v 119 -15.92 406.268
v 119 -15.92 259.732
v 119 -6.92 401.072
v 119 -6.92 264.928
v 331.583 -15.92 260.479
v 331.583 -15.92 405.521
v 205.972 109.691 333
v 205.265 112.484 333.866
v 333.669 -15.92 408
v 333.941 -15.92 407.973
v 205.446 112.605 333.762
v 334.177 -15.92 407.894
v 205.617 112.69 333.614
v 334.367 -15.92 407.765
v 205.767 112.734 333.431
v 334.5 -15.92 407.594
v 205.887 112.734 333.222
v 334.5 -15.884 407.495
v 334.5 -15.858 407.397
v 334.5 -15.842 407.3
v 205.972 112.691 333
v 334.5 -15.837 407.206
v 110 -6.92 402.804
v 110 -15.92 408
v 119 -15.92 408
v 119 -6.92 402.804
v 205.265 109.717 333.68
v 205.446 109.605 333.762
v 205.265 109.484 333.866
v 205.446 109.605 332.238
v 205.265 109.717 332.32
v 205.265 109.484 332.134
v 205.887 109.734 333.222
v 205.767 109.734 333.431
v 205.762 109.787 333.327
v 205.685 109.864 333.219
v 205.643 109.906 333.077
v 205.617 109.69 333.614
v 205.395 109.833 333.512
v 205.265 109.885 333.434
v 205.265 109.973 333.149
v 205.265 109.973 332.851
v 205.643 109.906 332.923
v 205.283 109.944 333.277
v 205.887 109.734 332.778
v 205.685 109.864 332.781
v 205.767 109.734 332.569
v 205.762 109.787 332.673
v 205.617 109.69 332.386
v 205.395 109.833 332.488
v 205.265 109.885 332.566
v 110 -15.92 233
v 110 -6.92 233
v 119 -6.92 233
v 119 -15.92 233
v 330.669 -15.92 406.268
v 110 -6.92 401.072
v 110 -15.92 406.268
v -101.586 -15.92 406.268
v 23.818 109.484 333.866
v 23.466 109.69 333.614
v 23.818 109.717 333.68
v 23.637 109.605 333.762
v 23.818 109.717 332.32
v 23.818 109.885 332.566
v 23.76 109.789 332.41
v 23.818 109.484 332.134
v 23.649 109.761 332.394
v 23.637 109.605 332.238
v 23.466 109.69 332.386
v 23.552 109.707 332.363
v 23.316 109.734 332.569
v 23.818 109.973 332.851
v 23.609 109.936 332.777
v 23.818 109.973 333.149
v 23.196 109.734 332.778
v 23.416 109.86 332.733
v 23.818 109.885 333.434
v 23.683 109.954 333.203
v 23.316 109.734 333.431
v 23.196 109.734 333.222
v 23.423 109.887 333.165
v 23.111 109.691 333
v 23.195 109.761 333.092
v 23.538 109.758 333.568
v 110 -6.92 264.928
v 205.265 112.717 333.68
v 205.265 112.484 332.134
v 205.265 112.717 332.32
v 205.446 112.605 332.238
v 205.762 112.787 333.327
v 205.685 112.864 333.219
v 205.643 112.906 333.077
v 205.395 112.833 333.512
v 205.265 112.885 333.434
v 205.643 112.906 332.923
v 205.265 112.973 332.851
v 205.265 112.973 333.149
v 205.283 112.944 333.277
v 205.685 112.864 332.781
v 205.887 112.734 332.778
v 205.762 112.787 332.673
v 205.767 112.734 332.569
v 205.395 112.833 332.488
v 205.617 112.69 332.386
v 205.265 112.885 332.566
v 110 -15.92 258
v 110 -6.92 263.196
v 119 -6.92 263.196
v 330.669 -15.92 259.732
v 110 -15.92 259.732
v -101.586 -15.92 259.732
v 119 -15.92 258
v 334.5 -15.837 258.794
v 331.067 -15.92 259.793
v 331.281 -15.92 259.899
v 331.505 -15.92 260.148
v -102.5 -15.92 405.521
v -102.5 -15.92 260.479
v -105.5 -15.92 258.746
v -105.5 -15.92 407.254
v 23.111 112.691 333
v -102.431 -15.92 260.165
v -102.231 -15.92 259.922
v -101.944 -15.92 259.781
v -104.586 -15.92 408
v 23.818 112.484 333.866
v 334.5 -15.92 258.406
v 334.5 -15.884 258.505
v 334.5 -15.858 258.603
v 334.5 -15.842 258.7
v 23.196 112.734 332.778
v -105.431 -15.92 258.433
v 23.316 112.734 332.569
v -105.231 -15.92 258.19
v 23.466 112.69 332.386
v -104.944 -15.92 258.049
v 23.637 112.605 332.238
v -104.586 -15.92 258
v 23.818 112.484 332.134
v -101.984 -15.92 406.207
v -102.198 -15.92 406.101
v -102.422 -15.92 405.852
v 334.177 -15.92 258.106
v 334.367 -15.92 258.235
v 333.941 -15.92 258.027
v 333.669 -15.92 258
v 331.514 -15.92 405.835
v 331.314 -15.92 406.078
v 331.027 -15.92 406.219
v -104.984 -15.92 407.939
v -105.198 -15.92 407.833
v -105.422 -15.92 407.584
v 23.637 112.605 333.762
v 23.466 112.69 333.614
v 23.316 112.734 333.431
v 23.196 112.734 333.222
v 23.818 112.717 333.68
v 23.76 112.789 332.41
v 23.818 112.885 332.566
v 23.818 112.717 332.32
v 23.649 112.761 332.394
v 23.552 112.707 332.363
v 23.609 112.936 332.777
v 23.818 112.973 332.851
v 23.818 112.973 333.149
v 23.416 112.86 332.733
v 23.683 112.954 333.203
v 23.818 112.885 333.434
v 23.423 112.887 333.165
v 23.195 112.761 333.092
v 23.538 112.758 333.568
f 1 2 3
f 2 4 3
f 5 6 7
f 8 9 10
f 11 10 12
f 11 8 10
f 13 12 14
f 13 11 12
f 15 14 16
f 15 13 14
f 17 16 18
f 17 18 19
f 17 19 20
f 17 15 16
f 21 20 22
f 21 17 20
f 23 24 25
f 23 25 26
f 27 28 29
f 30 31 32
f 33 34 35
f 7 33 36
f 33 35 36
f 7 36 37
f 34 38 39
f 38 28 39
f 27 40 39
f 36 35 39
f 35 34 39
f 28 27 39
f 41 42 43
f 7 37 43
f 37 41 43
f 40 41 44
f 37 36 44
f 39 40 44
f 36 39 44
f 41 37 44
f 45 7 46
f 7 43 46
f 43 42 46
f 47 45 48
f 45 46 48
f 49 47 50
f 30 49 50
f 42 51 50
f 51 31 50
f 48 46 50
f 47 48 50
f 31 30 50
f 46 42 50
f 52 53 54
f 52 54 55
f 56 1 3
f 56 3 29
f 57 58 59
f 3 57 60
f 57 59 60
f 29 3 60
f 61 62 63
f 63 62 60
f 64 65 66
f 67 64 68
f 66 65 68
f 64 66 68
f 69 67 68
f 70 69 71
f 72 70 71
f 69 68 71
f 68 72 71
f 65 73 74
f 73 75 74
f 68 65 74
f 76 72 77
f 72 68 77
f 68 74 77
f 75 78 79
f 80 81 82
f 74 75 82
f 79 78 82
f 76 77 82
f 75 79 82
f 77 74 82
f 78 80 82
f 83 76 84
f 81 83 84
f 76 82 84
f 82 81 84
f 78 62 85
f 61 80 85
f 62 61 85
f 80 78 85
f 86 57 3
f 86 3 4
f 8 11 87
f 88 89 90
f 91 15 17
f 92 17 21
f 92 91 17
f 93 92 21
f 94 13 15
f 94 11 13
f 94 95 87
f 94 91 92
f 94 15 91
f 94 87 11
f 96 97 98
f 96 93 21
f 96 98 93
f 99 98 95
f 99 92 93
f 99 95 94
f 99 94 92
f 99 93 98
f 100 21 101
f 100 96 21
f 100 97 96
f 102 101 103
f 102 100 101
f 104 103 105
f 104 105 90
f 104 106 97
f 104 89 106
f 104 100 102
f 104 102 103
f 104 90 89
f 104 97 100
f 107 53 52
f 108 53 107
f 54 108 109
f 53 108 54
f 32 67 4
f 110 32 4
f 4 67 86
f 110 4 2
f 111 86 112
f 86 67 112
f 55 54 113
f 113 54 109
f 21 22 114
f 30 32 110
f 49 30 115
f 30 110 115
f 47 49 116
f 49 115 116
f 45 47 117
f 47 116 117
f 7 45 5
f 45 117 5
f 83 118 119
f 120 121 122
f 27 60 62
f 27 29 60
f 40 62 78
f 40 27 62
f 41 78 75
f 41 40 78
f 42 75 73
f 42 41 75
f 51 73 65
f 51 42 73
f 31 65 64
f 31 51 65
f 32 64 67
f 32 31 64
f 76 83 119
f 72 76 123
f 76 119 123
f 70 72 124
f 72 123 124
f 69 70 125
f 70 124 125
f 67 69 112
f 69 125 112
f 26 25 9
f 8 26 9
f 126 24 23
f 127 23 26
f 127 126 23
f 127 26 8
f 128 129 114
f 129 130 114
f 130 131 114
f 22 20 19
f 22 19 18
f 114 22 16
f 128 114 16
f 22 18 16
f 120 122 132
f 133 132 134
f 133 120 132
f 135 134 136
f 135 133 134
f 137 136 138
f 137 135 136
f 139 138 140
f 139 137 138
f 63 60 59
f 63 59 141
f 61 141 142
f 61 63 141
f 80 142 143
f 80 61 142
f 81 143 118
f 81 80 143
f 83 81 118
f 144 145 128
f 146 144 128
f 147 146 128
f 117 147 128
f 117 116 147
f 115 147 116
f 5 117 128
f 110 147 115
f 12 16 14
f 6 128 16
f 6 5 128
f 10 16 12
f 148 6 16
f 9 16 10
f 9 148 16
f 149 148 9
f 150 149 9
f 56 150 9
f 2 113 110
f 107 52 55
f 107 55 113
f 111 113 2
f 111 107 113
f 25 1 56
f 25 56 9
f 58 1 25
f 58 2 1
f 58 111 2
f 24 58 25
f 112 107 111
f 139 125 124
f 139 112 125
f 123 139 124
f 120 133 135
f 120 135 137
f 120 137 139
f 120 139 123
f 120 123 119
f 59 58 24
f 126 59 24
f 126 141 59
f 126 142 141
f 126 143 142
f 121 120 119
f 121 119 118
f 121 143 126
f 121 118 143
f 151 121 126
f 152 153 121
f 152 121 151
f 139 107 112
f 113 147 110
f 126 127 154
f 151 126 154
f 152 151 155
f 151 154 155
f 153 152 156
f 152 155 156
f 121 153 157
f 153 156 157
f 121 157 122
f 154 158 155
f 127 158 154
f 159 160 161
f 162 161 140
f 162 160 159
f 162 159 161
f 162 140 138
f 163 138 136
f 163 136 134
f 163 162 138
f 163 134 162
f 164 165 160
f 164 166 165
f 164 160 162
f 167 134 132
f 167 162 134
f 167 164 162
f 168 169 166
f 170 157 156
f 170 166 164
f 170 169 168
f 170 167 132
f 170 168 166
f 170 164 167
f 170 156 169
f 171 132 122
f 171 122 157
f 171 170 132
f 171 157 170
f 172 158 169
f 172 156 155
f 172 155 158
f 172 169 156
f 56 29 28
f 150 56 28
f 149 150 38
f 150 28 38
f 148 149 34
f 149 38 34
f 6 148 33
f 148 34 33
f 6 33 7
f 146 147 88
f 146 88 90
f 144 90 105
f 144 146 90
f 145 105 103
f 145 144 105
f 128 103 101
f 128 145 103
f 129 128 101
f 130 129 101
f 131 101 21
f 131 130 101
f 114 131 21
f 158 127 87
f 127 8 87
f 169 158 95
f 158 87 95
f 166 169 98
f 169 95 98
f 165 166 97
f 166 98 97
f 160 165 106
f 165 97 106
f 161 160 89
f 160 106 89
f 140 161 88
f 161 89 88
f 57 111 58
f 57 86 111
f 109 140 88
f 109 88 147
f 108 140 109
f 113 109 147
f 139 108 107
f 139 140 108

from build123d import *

# Parameters (mm, degrees)
EXTRUDE001_DEPTH       = 9
BOX001_W               = 200
BOX001_H               = 200
BOX001_DEPTH           = 200
BOX001_PLACEMENT_ANGLE = 45
BOX_W                  = 200
BOX_H                  = 200
BOX_DEPTH              = 200
BOX_PLACEMENT_ANGLE    = 45
EXTRUDE_DEPTH          = 440
FILLET001_R            = 1
FILLET_R               = 1
FUSION_PLACEMENT_ANGLE = 90


with BuildPart() as extrude001:
    # Sketch001 → Extrude001 (new body)
    with BuildSketch(Plane.XY):
        Polygon((-75, 0), (-69.803848, 9), (100, 9), (100, 0), align=None)
    extrude(amount=EXTRUDE001_DEPTH)


with BuildPart() as extrude001_1:
    # Extrude001 placement: moved
    add(extrude001.part.moved(Location((0, 0, 215.5))))


with BuildPart() as cube001:
    # Box001 → Box001 (new body)
    with BuildSketch(Plane.XY):
        with Locations((100, 100)):
            Rectangle(BOX001_W, BOX001_H)
    extrude(amount=BOX001_DEPTH)


with BuildPart() as cube001_1:
    # Box001 placement: moved
    add(cube001.part.moved(Location((-96, 139.726, 300.357))).rotate(Axis((-96, 139.726, 300.357), (1, 0, 0)), BOX001_PLACEMENT_ANGLE))


with BuildPart() as cube:
    # Box → Box (new body)
    with BuildSketch(Plane.XY):
        with Locations((100, 100)):
            Rectangle(BOX_W, BOX_H)
    extrude(amount=BOX_DEPTH)


with BuildPart() as cube_1:
    # Box placement: moved
    add(cube.part.moved(Location((-96, 141.421356, -141.421356))).rotate(Axis((-96, 141.421356, -141.421356), (1, 0, 0)), BOX_PLACEMENT_ANGLE))


with BuildPart() as cut001:
    # Sketch → Extrude (new body)
    with BuildSketch(Plane.XY):
        Polygon((-75, 0), (0, 129.903811), (75, 0), align=None)
    extrude(amount=EXTRUDE_DEPTH)

    # Cut: cut Cube
    add(cube_1.part, mode=Mode.SUBTRACT)

    # Cut001: cut Cube001
    add(cube001_1.part, mode=Mode.SUBTRACT)


with BuildPart() as fillet001:
    # Fillet001 base: copy of Cut001
    add(cut001.part)

    # Fillet001
    fillet001_edges = [fillet001.edges().sort_by_distance(p)[0] for p in [
        (-37.5, 64.951905, 64.951905),
        (0, 129.903811, 220.0415),
        (-37.47604, 64.993405, 375.089595),
        (37.5, 64.951905, 64.951905),
        (37.47604, 64.993405, 375.089595),
    ]]
    fillet(fillet001_edges, radius=FILLET001_R)


with BuildPart() as fillet001_1:
    # Fillet001 placement: moved
    add(fillet001.part.moved(Location((0, -3, 0))))


with BuildPart() as fusion:
    # Fillet base: copy of Cut001
    add(cut001.part)

    # Fillet
    fillet_edges = [fusion.edges().sort_by_distance(p)[0] for p in [
        (-37.5, 64.951905, 64.951905),
        (0, 129.903811, 220.0415),
        (-37.47604, 64.993405, 375.089595),
        (37.5, 64.951905, 64.951905),
        (37.47604, 64.993405, 375.089595),
    ]]
    fillet(fillet_edges, radius=FILLET_R)

    # Cut002: cut Fillet001
    add(fillet001_1.part, mode=Mode.SUBTRACT)

    # Fusion: union Extrude001
    add(extrude001_1.part)


with BuildPart() as fusion_1:
    # Fusion placement: moved
    add(fusion.part.moved(Location((-105.5, -15.92, 333))).rotate(Axis((-105.5, -15.92, 333), (0, 1, 0)), FUSION_PLACEMENT_ANGLE))


solid = fusion_1.part
